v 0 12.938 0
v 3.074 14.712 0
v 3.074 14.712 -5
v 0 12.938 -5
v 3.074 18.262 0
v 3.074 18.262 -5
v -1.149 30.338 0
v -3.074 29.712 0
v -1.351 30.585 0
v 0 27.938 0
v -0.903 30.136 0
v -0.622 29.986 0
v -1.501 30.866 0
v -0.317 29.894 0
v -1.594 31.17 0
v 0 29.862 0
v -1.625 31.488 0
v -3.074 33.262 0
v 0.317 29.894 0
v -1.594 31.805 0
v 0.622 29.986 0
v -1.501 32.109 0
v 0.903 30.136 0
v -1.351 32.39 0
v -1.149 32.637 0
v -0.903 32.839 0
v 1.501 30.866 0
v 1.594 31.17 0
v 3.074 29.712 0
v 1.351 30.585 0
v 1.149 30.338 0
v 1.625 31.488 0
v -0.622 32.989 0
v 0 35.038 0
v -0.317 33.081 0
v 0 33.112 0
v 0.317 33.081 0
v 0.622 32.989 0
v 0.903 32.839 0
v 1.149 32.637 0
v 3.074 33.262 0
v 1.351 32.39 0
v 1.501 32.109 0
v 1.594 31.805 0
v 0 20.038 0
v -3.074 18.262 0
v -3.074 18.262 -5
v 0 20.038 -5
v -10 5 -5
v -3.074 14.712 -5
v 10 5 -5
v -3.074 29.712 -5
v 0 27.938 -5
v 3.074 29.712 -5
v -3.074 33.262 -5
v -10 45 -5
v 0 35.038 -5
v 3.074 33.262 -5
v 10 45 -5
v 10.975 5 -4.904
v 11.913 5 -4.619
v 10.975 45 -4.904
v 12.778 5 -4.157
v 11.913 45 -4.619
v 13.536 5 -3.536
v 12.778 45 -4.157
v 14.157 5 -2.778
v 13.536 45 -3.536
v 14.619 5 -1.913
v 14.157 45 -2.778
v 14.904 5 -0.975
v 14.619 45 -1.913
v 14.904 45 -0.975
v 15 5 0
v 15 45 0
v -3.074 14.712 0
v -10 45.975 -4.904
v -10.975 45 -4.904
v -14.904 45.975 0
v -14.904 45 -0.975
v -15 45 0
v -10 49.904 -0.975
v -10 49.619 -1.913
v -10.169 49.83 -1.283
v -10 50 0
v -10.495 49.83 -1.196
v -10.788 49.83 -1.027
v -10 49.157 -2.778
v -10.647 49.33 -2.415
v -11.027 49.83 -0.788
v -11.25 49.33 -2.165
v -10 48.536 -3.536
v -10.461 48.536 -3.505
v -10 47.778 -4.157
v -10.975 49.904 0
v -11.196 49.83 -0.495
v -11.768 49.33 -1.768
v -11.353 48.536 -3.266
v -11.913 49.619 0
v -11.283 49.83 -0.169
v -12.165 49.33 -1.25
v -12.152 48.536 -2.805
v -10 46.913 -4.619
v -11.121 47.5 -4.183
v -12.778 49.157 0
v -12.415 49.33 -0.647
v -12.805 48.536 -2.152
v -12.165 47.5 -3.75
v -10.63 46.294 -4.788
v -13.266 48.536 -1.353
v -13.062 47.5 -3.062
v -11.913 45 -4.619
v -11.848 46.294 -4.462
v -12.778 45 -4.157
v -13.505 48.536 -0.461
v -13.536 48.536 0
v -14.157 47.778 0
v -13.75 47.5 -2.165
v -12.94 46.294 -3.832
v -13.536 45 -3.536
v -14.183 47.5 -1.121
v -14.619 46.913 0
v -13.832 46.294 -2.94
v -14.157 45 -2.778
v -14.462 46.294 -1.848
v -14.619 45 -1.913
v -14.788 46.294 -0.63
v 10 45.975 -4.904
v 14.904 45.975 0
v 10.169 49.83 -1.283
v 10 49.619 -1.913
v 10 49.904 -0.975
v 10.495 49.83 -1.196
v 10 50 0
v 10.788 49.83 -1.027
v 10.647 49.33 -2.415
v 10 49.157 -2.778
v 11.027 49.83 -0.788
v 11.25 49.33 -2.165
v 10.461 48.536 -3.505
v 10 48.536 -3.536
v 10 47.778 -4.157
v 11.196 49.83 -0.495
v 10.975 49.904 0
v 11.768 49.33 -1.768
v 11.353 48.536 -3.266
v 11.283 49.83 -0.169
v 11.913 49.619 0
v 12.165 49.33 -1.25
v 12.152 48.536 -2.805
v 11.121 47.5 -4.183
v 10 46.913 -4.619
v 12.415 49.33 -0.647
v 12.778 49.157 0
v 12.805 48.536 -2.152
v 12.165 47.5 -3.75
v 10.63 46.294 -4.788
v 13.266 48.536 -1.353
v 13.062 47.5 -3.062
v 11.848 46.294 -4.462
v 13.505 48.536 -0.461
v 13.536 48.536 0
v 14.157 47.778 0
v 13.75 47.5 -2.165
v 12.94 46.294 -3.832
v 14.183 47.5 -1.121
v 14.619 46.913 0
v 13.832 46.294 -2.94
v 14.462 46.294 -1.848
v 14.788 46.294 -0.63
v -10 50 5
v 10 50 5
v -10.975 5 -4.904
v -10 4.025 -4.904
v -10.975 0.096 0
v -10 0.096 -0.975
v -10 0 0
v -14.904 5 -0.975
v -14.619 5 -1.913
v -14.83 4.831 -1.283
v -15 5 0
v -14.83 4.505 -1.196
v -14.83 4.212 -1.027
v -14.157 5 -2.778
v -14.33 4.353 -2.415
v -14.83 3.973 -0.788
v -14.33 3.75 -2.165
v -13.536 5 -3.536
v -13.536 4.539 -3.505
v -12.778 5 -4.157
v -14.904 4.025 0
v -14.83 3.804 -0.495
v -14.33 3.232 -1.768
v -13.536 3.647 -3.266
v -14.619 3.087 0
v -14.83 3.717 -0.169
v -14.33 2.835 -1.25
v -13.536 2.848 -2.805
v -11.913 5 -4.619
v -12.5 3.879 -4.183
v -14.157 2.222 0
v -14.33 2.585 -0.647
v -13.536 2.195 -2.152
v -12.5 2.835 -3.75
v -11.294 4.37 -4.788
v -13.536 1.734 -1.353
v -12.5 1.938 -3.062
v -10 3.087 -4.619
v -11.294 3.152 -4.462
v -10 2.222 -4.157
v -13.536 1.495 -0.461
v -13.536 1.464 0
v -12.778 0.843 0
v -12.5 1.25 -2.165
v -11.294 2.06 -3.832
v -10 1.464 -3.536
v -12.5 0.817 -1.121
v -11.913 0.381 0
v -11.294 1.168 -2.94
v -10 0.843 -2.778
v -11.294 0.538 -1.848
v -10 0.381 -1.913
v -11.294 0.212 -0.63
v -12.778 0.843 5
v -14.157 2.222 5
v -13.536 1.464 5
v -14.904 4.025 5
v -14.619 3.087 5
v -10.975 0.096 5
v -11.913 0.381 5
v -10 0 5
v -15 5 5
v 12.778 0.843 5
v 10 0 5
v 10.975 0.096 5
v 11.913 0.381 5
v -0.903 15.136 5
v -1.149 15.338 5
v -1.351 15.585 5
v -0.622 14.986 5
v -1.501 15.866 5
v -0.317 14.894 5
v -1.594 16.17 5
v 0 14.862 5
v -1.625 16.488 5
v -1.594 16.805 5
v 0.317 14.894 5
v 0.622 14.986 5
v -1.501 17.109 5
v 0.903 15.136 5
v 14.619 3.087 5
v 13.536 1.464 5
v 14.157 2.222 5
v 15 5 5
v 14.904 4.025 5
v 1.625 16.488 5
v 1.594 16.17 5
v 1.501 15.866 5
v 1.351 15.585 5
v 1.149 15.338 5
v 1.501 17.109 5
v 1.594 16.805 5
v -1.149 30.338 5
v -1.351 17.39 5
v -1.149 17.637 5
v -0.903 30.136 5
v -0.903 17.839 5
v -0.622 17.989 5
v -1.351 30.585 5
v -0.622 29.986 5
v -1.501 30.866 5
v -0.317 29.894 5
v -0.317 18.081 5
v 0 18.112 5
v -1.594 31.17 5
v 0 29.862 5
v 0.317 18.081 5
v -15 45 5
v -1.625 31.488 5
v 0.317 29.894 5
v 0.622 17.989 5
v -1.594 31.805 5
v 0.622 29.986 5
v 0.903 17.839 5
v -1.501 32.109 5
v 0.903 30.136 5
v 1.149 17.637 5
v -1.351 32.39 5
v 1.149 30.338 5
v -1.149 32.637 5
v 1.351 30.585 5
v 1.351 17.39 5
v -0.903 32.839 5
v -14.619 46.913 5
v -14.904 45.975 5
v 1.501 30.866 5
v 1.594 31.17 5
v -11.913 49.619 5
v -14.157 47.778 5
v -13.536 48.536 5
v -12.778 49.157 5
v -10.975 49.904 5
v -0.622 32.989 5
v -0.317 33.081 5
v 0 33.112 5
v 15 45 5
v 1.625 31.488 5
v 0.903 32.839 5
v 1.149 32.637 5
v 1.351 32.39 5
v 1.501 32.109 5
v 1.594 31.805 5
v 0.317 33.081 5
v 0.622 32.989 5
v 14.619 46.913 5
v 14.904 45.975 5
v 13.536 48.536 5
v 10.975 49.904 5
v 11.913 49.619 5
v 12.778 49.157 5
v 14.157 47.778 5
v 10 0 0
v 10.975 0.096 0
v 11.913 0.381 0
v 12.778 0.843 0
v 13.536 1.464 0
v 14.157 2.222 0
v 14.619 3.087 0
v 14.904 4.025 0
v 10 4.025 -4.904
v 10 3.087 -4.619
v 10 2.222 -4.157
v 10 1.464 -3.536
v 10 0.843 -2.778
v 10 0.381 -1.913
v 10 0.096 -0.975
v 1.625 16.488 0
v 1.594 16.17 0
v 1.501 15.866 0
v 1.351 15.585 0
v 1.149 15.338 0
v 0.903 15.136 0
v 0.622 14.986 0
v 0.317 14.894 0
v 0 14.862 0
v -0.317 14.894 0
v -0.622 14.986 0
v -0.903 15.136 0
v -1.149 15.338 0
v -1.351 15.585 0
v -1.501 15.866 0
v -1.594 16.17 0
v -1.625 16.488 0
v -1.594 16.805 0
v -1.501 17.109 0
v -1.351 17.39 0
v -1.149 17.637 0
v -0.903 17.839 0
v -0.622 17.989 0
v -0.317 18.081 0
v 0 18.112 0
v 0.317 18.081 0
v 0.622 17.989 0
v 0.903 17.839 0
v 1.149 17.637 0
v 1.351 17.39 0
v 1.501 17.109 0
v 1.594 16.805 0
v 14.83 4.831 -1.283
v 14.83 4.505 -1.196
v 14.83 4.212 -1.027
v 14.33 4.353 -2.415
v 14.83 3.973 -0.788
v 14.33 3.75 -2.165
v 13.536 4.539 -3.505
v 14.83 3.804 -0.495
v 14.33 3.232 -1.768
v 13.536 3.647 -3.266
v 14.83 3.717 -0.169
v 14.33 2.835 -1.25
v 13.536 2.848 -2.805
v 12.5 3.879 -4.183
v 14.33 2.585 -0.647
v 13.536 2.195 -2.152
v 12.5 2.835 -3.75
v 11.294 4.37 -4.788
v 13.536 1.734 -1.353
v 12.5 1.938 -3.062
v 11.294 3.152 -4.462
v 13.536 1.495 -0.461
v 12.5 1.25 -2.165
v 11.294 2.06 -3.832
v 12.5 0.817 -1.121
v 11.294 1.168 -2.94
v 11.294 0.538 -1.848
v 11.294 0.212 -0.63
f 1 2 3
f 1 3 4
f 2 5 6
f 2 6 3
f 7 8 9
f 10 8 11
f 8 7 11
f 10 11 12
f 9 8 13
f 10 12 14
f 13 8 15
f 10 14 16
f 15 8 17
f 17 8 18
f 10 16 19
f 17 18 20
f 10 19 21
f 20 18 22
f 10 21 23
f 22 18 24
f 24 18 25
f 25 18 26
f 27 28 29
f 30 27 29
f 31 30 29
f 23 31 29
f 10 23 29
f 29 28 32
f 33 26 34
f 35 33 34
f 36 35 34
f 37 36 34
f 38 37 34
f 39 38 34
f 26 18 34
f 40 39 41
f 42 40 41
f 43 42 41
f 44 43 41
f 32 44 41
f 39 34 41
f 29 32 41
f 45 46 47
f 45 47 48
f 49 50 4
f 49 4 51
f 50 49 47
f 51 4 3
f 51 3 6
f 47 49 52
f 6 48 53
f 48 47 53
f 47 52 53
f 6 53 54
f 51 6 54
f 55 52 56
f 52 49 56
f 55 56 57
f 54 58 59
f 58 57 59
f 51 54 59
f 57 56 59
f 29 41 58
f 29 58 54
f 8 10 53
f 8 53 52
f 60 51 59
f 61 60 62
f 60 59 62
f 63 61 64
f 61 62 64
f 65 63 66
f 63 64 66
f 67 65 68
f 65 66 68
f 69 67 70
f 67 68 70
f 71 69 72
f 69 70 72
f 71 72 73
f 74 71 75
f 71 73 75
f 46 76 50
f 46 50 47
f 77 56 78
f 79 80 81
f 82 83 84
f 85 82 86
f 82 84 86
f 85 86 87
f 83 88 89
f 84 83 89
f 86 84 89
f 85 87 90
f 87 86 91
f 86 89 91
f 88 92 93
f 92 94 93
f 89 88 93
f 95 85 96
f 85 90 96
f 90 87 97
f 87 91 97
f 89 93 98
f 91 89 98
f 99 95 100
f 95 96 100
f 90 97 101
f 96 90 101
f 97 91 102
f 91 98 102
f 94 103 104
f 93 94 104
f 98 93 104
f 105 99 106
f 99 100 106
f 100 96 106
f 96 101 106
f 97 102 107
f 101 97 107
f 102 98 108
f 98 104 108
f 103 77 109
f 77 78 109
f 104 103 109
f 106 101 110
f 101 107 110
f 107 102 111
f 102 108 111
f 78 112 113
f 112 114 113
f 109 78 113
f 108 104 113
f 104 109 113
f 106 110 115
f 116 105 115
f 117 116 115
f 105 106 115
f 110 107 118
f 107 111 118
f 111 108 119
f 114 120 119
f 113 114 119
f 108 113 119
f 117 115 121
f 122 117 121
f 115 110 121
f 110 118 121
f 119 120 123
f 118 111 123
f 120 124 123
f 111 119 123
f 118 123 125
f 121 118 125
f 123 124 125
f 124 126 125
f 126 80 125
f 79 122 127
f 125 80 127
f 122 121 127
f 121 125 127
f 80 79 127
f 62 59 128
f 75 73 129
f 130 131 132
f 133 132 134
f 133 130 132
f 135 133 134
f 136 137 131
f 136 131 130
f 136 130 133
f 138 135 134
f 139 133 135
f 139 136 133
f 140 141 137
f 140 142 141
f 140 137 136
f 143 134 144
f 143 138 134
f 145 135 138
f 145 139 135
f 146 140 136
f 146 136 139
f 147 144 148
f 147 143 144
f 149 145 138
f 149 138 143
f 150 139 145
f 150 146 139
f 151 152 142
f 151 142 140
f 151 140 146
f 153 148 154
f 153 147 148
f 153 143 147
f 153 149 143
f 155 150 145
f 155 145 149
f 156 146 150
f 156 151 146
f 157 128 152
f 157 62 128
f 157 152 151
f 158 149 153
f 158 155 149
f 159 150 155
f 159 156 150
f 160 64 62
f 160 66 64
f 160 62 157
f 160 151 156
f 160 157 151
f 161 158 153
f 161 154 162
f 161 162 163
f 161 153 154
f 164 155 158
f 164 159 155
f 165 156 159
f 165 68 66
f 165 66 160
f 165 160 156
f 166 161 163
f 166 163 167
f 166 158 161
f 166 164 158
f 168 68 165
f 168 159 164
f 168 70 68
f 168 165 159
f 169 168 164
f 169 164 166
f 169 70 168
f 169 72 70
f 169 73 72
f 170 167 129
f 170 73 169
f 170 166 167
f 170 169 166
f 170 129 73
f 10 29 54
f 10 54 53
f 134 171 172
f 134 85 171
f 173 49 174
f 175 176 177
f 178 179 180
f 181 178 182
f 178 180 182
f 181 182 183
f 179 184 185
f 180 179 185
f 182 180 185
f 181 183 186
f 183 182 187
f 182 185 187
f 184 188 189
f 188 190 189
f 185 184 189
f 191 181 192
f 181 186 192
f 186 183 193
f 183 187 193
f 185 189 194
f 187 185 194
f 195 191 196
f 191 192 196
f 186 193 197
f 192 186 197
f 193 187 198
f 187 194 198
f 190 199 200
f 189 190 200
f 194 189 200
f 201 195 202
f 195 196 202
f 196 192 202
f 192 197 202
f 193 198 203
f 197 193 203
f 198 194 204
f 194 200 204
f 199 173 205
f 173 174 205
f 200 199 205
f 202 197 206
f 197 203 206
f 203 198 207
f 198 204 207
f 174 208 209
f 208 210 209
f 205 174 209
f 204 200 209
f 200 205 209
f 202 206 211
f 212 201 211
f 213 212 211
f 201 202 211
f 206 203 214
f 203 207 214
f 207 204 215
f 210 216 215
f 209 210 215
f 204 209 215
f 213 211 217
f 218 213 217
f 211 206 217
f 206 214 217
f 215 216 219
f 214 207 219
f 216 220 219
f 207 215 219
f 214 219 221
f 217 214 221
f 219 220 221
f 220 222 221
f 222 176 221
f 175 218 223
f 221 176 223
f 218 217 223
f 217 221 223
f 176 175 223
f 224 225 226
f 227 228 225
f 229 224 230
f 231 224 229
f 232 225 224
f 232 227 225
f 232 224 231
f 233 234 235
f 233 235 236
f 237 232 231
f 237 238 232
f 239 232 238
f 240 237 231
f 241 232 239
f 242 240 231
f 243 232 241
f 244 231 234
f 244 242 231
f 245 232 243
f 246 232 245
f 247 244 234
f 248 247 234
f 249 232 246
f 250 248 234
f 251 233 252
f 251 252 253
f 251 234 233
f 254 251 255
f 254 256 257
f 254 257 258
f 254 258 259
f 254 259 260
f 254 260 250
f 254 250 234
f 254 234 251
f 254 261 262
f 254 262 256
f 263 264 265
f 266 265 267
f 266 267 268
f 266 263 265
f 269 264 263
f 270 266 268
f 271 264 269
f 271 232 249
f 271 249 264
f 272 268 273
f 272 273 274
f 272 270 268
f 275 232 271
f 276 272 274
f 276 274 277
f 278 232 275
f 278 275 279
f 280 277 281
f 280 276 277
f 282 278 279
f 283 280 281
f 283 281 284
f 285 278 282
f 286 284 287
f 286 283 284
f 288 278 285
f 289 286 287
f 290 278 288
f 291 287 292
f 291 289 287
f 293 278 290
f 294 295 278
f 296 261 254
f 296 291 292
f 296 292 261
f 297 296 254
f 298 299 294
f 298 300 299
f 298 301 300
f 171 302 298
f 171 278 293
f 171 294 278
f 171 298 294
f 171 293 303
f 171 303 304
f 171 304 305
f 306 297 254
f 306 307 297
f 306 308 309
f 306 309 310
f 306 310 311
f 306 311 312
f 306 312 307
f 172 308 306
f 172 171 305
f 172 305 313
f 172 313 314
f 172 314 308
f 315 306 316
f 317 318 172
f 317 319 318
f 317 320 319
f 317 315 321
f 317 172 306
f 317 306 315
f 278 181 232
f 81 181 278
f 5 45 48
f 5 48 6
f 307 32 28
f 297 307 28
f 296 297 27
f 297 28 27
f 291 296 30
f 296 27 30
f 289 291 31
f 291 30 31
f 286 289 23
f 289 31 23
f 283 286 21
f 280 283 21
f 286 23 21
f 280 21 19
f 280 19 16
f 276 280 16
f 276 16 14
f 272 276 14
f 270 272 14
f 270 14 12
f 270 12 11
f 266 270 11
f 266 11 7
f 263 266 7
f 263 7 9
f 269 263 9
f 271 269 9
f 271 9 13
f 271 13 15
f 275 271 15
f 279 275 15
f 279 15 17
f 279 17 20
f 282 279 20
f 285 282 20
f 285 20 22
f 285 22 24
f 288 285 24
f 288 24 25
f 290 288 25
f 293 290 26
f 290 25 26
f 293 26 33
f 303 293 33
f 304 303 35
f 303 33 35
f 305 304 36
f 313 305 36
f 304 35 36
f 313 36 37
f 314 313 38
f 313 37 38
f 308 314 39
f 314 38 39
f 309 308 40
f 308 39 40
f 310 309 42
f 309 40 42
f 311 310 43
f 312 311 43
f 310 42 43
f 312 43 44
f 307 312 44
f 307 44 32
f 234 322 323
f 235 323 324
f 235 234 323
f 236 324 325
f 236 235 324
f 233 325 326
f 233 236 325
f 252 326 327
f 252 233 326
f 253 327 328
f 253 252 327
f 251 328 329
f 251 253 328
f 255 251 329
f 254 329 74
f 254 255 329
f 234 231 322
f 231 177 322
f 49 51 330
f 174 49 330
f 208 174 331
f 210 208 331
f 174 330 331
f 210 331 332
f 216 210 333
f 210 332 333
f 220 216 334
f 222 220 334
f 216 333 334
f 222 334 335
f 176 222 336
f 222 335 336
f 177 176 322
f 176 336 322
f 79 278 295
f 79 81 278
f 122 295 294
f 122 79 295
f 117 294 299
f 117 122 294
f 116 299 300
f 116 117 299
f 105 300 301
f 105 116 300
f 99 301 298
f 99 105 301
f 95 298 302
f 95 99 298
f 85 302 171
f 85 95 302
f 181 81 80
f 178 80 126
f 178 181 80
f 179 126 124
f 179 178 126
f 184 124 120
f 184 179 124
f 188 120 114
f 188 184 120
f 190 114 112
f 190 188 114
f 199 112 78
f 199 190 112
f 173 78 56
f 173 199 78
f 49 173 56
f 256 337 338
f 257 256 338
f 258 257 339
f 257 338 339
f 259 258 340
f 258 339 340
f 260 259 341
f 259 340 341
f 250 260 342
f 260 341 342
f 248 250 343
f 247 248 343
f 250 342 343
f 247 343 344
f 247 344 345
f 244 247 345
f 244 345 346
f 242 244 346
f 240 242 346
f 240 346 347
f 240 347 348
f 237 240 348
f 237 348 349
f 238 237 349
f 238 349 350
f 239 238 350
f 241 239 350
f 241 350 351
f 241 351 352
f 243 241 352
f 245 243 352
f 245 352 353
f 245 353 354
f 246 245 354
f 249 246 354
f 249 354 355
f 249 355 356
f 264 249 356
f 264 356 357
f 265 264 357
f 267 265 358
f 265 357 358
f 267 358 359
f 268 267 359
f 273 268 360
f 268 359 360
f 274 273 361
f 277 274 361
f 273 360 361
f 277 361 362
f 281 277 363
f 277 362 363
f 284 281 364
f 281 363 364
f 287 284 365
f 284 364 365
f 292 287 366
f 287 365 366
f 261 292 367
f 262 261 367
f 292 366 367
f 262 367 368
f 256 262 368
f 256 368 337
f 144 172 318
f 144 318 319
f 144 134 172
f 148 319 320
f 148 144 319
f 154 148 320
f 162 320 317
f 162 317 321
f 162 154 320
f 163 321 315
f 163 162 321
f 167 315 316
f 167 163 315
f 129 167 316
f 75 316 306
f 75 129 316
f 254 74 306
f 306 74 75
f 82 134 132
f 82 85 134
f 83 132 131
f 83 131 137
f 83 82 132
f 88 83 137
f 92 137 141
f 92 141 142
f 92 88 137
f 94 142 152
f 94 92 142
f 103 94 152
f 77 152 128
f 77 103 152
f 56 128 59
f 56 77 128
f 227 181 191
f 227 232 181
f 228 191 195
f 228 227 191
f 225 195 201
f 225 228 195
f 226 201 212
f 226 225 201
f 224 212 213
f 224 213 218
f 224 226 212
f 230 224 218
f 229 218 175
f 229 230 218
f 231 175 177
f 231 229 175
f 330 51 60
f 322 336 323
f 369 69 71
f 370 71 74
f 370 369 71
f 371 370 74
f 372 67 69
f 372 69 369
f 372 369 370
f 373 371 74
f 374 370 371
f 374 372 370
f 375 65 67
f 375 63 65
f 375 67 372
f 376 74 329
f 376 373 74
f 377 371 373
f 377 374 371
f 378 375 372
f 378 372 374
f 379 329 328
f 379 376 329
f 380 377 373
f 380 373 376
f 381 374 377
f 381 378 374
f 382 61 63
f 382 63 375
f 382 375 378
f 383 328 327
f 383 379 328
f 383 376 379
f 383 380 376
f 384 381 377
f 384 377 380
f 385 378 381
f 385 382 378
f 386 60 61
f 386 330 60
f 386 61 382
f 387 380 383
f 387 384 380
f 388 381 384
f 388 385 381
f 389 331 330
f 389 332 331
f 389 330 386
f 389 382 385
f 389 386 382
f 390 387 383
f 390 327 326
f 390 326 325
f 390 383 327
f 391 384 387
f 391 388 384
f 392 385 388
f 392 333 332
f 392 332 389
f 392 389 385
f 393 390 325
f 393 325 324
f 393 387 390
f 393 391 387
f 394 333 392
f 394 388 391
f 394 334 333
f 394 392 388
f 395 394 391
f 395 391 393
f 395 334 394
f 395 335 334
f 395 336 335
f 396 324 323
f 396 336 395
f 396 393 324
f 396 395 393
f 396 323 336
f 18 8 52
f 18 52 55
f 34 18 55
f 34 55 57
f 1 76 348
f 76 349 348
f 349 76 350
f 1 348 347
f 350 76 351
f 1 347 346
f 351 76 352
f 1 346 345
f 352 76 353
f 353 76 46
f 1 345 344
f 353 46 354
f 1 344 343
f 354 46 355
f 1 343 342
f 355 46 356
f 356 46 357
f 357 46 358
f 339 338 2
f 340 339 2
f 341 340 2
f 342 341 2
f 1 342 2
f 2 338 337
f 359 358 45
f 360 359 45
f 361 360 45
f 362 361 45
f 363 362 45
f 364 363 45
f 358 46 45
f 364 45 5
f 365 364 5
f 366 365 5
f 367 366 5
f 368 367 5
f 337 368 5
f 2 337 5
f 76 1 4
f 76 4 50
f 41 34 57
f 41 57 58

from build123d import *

# Parameters (mm, degrees)
F1_DEPTH = 5
F2_W     = 30
F2_H     = 50
F3_DEPTH = 5
F4_R     = 1.625
F5_DEPTH = 25
F6_R     = 5


with BuildPart() as f1:
    # F0 (on Top) → F1 (new body)
    with BuildSketch(Plane.XY):
        Polygon((-15, 50), (-15, 0), (0, 0), (15, 0), (15, 50), (0, 50), align=None)
        Polygon((3.07439, 18.2625), (3.07439, 14.7125), (0, 12.9375), (-3.07439, 14.7125), (-3.07439, 18.2625), (0, 20.0375), align=None, mode=Mode.SUBTRACT)
        Polygon((3.07439, 29.7125), (0, 27.9375), (-3.07439, 29.7125), (-3.07439, 33.2625), (0, 35.0375), (3.07439, 33.2625), align=None, mode=Mode.SUBTRACT)
    extrude(amount=-F1_DEPTH)

    # F2 (on Top) → F3 (join)
    with BuildSketch(Plane.XY):
        with Locations((0, 25)):
            Rectangle(F2_W, F2_H)
    extrude(amount=F3_DEPTH)

    # F4 (on face) → F5 (cut)
    with BuildSketch(Plane(origin=(0, 0, -5), x_dir=(1, 0, 0), z_dir=(0, 0, -1))):
        with Locations((0, -16.4875)):
            Circle(F4_R)
        with Locations((0, -31.4875)):
            Circle(F4_R)
    extrude(amount=-F5_DEPTH, mode=Mode.SUBTRACT)

    # F6
    f6_edges = [f1.edges().sort_by_distance(p)[0] for p in [
        (0, 0, -5),
        (-15, 25, -5),
        (15, 25, -5),
        (0, 50, -5),
        (15, 50, 0),
        (-15, 0, 0),
        (-15, 50, 0),
        (15, 0, 0),
    ]]
    fillet(f6_edges, radius=F6_R)


solid = f1.part
